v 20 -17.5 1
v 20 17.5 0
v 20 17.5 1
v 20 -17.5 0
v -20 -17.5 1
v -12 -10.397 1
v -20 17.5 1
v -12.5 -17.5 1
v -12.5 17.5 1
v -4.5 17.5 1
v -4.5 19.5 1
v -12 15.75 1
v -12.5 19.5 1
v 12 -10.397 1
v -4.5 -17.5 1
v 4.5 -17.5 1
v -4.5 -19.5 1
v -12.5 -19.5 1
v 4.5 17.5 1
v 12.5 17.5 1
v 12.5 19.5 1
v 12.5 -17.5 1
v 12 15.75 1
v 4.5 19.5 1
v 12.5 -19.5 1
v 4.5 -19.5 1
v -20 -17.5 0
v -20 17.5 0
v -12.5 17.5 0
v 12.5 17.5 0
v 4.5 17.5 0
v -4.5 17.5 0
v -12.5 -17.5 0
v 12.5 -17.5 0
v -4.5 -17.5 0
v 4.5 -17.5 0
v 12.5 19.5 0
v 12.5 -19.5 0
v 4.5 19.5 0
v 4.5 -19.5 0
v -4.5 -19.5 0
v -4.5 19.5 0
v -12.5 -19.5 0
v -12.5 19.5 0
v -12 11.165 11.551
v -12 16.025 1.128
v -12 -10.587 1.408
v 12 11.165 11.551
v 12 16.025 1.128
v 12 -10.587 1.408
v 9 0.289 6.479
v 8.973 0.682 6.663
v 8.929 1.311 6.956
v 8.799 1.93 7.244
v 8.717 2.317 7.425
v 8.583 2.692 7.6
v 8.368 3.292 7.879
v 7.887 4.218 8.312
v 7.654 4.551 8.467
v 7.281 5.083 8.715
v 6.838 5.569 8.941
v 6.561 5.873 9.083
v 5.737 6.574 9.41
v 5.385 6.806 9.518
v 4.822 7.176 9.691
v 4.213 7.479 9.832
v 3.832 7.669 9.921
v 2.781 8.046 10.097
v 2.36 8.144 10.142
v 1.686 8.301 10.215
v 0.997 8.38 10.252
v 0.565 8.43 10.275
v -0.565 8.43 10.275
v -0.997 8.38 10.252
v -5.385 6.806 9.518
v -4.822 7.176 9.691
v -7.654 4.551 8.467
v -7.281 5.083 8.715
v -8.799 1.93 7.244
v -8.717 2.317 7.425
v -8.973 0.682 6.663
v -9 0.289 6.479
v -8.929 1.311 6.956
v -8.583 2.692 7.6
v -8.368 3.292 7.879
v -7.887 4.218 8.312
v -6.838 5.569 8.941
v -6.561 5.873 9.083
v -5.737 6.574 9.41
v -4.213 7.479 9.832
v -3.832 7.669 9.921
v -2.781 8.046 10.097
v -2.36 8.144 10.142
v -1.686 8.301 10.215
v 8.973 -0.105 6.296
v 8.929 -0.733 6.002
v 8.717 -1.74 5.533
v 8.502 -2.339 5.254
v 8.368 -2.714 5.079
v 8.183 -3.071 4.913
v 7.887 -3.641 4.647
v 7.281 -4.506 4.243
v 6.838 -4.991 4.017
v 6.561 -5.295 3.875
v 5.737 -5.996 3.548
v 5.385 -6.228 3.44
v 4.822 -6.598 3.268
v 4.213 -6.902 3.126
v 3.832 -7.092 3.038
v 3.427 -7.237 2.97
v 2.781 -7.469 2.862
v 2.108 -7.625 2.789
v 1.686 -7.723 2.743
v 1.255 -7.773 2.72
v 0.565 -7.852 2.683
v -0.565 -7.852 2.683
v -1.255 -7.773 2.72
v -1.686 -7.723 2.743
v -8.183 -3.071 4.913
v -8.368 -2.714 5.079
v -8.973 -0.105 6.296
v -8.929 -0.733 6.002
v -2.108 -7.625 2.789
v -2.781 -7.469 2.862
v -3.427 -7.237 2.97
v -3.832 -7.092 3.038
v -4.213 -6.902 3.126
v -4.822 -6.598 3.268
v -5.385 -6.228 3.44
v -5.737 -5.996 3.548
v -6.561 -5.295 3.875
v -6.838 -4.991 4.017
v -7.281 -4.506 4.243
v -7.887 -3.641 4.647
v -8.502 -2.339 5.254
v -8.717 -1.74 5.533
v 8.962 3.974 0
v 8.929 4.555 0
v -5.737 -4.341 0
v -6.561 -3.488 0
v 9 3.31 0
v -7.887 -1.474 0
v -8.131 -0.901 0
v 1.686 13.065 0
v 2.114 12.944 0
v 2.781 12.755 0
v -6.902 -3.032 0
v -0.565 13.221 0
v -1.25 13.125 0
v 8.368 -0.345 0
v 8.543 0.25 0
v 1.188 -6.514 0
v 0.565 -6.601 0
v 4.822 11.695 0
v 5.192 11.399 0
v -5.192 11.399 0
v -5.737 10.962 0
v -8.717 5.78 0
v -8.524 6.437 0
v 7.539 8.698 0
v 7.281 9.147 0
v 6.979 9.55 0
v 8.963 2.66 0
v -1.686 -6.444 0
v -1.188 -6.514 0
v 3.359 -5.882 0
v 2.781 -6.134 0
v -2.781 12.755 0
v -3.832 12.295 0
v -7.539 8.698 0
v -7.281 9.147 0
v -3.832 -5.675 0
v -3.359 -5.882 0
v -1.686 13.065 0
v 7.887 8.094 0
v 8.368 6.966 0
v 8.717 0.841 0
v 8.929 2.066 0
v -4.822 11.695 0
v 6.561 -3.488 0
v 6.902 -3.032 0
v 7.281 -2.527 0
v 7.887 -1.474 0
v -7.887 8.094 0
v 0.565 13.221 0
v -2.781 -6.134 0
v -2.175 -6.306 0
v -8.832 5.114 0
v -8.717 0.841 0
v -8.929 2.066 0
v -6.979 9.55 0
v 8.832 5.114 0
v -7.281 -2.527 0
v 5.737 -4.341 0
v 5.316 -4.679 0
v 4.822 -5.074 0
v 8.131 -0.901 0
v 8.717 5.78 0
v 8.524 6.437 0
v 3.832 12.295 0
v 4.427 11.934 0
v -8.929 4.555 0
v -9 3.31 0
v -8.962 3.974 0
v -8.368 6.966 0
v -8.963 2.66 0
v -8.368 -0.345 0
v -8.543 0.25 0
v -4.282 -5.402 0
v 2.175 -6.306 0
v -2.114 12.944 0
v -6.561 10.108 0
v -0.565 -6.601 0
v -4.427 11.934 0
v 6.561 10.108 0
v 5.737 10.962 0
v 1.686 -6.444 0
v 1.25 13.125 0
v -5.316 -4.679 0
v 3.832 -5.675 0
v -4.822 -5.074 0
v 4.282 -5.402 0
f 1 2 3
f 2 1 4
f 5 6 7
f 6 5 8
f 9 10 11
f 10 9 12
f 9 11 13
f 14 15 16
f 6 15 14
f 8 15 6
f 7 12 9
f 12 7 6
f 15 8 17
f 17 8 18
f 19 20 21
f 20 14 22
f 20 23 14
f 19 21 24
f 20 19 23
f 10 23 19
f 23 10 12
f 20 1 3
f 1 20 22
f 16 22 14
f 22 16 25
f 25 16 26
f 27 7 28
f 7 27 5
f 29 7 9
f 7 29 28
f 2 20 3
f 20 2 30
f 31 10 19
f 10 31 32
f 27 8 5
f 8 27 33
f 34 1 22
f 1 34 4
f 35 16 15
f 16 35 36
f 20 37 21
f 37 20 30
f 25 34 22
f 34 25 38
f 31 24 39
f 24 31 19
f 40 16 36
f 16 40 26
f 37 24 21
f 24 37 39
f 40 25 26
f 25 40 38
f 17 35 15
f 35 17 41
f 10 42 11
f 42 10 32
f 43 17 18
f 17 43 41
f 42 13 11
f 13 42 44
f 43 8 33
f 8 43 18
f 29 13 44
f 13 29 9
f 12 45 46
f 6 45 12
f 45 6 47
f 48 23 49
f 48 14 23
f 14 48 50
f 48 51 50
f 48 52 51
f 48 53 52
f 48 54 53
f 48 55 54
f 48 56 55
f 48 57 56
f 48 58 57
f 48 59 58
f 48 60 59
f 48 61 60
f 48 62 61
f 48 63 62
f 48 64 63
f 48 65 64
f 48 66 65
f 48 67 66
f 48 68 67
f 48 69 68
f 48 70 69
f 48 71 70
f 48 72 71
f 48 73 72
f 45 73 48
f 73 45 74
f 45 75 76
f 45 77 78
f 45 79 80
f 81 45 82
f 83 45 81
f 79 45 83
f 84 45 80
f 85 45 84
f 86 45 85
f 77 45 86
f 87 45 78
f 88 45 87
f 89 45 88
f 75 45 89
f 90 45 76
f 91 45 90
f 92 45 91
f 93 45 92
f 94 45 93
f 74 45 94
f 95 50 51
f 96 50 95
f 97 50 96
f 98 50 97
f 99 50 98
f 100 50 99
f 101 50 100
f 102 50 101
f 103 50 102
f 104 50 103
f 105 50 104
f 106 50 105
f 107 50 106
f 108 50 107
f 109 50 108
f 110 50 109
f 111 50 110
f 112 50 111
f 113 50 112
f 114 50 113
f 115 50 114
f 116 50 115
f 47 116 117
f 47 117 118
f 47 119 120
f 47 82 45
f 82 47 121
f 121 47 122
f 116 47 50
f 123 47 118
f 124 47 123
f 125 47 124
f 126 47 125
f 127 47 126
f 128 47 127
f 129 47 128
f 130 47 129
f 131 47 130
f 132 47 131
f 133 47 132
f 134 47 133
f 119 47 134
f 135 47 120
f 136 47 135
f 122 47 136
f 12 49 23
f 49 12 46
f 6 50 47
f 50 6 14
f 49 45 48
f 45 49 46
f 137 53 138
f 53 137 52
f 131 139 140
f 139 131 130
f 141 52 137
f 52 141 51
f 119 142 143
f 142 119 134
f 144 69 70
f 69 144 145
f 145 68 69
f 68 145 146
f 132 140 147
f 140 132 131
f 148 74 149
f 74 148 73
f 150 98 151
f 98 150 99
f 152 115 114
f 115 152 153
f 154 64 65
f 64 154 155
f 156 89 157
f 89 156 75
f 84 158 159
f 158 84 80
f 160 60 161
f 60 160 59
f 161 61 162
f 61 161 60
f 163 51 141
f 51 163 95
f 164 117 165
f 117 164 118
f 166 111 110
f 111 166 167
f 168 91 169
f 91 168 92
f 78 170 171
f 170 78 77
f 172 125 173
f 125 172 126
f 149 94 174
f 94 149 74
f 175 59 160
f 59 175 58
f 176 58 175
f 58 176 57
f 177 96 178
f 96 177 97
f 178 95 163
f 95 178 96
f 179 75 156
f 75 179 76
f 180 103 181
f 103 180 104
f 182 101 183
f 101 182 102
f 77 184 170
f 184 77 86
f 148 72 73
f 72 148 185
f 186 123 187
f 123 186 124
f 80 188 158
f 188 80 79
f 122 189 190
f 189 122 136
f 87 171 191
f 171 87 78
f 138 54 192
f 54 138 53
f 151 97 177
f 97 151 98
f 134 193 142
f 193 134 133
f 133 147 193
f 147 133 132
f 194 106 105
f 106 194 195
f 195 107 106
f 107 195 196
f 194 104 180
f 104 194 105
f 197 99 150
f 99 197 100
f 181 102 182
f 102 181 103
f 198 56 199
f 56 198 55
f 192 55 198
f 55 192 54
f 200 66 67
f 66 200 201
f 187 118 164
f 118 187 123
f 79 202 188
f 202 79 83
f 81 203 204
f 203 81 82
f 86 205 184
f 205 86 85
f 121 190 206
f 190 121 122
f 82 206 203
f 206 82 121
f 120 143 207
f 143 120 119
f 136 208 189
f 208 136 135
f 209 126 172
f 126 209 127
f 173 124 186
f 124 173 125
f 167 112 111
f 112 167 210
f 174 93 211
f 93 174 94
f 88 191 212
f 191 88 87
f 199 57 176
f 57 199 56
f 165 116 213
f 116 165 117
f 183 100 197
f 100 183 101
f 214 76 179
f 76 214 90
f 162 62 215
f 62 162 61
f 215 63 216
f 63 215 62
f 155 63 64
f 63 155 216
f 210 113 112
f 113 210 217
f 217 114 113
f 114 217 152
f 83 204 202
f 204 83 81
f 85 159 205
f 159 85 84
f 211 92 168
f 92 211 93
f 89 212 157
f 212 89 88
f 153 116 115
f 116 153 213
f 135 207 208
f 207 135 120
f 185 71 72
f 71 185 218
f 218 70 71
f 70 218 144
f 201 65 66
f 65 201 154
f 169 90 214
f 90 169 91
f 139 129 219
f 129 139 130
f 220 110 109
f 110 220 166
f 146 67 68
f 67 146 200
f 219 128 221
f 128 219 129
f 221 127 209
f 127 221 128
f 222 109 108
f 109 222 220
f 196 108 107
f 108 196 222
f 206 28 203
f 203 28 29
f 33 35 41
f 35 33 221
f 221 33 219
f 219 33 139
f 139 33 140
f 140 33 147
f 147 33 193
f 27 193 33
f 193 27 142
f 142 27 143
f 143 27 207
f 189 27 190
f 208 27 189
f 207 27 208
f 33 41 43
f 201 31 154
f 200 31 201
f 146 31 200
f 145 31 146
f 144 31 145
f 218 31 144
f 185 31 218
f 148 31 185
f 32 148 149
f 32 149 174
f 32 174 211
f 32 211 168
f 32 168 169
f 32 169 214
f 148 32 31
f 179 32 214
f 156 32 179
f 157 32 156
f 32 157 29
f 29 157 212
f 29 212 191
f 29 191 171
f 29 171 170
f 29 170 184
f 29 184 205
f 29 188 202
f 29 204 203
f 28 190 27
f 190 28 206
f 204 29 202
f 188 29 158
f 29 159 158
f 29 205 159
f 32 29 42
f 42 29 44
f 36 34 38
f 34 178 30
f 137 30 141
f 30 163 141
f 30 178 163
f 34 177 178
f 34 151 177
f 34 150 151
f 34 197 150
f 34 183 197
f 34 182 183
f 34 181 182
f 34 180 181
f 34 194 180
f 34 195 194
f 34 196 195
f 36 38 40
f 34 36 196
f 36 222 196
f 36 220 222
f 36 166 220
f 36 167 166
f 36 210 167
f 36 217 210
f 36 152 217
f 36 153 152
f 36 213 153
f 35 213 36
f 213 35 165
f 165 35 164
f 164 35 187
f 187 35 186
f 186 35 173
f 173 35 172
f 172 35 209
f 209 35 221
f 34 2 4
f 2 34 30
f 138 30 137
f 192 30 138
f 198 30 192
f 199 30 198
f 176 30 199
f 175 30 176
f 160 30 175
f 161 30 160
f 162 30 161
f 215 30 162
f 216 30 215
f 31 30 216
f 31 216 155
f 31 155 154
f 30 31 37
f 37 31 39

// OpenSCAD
$fn=50*1;
//desired angle
angle=25;  // [0:35]
//verical offset of camera
voff=3; //[-4:5,]
//Thickness of angled prortion
setback=10.5; //[-8:20]

tw=8.5*1;
tc=8.5*1;
th=2*1;


difference(){
    union(){
        //Main plate
        cube([40,35,th],center=true);
        //Tabs
        translate([tc,0,0])
         cube([8,39,th],center=true);
        mirror([1, 0, 0])
         translate([tc,0,0])
          cube([8,39,th],center=true);     
        //Angle
        rotate([angle,0,0])
         translate([0,voff,0])
         cube([24,24,12-(11-setback)],center=true);
    }
    
    //cam hole
    rotate([angle,0,0])
     translate([0,voff,0])
      cylinder(h=50,r=9,center=true);
    
    //clean up the front
    translate([-25,-25,-50])
     cube([50,50,50]);
}
